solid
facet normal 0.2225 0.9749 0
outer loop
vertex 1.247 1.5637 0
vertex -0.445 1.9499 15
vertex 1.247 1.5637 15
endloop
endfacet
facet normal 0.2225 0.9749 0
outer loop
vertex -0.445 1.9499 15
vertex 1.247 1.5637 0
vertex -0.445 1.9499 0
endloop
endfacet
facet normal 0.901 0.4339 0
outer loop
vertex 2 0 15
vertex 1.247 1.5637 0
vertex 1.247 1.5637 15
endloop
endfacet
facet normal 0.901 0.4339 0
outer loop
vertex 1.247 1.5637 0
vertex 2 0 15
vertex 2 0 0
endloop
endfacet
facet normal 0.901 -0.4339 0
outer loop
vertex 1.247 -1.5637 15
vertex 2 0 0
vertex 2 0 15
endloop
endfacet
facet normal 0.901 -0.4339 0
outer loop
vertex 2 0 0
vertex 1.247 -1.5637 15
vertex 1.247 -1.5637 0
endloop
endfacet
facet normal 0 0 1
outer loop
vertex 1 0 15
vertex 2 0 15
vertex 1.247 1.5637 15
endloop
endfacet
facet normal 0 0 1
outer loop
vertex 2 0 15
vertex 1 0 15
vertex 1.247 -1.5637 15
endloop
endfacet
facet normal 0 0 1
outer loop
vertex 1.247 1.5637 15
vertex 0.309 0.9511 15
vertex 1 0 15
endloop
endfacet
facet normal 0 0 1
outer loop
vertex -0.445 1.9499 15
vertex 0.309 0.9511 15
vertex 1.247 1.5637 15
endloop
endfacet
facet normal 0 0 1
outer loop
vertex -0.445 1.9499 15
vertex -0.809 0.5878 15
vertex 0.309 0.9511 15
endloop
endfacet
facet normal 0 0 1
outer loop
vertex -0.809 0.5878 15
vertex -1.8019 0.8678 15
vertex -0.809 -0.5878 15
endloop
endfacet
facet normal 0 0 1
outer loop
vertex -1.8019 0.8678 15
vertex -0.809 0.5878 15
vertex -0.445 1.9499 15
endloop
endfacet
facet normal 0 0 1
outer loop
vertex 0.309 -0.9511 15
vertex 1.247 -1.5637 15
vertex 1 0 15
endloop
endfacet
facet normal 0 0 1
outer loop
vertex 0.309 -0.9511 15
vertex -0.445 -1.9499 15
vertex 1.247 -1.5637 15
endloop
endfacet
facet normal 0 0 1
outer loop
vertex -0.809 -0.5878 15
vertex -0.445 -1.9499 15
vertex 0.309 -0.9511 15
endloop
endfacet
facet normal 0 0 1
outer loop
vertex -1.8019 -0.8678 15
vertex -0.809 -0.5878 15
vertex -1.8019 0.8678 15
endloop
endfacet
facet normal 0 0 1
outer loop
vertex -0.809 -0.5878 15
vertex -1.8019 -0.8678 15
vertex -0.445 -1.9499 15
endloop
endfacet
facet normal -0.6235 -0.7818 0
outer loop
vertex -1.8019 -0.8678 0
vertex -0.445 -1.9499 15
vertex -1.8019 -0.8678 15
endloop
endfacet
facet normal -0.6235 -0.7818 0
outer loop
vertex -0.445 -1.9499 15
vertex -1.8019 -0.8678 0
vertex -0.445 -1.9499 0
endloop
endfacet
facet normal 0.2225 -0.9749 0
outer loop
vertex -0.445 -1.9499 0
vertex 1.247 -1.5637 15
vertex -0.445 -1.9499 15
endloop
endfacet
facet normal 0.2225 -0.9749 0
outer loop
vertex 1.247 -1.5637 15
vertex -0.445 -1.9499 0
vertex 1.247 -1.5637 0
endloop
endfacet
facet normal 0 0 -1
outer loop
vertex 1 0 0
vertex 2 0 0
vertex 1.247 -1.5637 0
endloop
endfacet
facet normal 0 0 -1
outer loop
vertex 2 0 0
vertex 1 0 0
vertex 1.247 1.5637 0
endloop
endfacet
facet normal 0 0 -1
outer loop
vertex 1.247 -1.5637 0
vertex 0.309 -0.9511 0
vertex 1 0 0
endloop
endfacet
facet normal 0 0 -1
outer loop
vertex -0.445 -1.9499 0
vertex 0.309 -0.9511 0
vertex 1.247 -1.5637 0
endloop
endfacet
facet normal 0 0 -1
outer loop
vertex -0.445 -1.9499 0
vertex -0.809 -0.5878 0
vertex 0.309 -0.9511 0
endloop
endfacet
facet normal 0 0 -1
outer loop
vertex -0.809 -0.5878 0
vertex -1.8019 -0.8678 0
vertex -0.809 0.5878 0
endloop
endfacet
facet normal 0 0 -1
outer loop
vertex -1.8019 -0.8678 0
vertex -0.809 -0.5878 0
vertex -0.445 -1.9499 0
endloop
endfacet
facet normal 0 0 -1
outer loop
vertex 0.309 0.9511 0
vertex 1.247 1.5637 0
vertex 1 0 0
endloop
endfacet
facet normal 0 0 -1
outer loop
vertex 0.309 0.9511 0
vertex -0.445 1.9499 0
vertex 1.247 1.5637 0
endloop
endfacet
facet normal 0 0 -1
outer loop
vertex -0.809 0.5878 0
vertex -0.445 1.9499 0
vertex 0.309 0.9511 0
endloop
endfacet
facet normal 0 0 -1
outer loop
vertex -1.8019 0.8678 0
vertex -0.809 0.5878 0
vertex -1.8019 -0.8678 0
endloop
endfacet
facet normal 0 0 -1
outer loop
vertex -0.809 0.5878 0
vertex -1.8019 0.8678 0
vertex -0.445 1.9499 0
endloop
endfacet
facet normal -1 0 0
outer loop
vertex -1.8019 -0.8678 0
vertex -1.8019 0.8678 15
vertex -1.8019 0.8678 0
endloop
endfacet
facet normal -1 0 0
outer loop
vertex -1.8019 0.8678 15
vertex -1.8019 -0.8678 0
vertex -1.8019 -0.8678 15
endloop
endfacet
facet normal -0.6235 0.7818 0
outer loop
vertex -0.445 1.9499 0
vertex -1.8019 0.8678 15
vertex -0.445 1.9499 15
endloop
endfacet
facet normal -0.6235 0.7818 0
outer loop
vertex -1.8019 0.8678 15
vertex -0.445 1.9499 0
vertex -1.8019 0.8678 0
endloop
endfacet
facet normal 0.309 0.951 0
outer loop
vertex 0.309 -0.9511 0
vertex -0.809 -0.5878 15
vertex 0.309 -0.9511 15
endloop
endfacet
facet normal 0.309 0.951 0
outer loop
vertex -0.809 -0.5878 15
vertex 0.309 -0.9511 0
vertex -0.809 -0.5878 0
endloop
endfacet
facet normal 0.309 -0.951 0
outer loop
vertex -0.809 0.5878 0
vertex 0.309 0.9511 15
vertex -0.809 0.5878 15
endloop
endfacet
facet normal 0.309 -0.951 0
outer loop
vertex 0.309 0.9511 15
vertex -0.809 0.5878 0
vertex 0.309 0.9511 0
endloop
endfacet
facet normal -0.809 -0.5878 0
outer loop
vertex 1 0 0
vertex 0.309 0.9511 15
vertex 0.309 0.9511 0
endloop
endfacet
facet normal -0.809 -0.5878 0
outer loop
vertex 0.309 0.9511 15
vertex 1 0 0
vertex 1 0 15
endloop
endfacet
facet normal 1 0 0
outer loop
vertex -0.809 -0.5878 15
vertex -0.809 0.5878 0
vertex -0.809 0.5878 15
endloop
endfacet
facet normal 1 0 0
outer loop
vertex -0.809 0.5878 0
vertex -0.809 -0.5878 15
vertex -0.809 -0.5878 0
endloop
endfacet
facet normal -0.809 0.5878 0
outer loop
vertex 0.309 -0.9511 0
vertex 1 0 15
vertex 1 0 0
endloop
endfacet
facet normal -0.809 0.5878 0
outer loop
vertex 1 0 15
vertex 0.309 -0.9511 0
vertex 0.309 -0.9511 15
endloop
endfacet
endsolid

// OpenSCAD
// Parameters
length = 15; //[8:30:1]
outer_diameter = 4; //[2:8:0.1]
inner_diameter = 2; //[0.5:6:0.1]
forced_id = 0; //[0:6:0.1]
center = 1; //[0:1:1]
eps = 0.8; //[0.2:2:0.1]

// Tubing - complete geometry
module tubing() {
  color([0.85, 0.85, 0.8]) { // PTFE-like color
    difference() {
      // Outer tube
      cylinder(h=length, r=outer_diameter/2, center=center);
      // Inner bore
      cylinder(h=length + 2*eps, r=((forced_id > 0) ? forced_id : inner_diameter)/2, center=center);
    }
  }
}

// Assembly
module assembly() {
  tubing();
}

assembly();
